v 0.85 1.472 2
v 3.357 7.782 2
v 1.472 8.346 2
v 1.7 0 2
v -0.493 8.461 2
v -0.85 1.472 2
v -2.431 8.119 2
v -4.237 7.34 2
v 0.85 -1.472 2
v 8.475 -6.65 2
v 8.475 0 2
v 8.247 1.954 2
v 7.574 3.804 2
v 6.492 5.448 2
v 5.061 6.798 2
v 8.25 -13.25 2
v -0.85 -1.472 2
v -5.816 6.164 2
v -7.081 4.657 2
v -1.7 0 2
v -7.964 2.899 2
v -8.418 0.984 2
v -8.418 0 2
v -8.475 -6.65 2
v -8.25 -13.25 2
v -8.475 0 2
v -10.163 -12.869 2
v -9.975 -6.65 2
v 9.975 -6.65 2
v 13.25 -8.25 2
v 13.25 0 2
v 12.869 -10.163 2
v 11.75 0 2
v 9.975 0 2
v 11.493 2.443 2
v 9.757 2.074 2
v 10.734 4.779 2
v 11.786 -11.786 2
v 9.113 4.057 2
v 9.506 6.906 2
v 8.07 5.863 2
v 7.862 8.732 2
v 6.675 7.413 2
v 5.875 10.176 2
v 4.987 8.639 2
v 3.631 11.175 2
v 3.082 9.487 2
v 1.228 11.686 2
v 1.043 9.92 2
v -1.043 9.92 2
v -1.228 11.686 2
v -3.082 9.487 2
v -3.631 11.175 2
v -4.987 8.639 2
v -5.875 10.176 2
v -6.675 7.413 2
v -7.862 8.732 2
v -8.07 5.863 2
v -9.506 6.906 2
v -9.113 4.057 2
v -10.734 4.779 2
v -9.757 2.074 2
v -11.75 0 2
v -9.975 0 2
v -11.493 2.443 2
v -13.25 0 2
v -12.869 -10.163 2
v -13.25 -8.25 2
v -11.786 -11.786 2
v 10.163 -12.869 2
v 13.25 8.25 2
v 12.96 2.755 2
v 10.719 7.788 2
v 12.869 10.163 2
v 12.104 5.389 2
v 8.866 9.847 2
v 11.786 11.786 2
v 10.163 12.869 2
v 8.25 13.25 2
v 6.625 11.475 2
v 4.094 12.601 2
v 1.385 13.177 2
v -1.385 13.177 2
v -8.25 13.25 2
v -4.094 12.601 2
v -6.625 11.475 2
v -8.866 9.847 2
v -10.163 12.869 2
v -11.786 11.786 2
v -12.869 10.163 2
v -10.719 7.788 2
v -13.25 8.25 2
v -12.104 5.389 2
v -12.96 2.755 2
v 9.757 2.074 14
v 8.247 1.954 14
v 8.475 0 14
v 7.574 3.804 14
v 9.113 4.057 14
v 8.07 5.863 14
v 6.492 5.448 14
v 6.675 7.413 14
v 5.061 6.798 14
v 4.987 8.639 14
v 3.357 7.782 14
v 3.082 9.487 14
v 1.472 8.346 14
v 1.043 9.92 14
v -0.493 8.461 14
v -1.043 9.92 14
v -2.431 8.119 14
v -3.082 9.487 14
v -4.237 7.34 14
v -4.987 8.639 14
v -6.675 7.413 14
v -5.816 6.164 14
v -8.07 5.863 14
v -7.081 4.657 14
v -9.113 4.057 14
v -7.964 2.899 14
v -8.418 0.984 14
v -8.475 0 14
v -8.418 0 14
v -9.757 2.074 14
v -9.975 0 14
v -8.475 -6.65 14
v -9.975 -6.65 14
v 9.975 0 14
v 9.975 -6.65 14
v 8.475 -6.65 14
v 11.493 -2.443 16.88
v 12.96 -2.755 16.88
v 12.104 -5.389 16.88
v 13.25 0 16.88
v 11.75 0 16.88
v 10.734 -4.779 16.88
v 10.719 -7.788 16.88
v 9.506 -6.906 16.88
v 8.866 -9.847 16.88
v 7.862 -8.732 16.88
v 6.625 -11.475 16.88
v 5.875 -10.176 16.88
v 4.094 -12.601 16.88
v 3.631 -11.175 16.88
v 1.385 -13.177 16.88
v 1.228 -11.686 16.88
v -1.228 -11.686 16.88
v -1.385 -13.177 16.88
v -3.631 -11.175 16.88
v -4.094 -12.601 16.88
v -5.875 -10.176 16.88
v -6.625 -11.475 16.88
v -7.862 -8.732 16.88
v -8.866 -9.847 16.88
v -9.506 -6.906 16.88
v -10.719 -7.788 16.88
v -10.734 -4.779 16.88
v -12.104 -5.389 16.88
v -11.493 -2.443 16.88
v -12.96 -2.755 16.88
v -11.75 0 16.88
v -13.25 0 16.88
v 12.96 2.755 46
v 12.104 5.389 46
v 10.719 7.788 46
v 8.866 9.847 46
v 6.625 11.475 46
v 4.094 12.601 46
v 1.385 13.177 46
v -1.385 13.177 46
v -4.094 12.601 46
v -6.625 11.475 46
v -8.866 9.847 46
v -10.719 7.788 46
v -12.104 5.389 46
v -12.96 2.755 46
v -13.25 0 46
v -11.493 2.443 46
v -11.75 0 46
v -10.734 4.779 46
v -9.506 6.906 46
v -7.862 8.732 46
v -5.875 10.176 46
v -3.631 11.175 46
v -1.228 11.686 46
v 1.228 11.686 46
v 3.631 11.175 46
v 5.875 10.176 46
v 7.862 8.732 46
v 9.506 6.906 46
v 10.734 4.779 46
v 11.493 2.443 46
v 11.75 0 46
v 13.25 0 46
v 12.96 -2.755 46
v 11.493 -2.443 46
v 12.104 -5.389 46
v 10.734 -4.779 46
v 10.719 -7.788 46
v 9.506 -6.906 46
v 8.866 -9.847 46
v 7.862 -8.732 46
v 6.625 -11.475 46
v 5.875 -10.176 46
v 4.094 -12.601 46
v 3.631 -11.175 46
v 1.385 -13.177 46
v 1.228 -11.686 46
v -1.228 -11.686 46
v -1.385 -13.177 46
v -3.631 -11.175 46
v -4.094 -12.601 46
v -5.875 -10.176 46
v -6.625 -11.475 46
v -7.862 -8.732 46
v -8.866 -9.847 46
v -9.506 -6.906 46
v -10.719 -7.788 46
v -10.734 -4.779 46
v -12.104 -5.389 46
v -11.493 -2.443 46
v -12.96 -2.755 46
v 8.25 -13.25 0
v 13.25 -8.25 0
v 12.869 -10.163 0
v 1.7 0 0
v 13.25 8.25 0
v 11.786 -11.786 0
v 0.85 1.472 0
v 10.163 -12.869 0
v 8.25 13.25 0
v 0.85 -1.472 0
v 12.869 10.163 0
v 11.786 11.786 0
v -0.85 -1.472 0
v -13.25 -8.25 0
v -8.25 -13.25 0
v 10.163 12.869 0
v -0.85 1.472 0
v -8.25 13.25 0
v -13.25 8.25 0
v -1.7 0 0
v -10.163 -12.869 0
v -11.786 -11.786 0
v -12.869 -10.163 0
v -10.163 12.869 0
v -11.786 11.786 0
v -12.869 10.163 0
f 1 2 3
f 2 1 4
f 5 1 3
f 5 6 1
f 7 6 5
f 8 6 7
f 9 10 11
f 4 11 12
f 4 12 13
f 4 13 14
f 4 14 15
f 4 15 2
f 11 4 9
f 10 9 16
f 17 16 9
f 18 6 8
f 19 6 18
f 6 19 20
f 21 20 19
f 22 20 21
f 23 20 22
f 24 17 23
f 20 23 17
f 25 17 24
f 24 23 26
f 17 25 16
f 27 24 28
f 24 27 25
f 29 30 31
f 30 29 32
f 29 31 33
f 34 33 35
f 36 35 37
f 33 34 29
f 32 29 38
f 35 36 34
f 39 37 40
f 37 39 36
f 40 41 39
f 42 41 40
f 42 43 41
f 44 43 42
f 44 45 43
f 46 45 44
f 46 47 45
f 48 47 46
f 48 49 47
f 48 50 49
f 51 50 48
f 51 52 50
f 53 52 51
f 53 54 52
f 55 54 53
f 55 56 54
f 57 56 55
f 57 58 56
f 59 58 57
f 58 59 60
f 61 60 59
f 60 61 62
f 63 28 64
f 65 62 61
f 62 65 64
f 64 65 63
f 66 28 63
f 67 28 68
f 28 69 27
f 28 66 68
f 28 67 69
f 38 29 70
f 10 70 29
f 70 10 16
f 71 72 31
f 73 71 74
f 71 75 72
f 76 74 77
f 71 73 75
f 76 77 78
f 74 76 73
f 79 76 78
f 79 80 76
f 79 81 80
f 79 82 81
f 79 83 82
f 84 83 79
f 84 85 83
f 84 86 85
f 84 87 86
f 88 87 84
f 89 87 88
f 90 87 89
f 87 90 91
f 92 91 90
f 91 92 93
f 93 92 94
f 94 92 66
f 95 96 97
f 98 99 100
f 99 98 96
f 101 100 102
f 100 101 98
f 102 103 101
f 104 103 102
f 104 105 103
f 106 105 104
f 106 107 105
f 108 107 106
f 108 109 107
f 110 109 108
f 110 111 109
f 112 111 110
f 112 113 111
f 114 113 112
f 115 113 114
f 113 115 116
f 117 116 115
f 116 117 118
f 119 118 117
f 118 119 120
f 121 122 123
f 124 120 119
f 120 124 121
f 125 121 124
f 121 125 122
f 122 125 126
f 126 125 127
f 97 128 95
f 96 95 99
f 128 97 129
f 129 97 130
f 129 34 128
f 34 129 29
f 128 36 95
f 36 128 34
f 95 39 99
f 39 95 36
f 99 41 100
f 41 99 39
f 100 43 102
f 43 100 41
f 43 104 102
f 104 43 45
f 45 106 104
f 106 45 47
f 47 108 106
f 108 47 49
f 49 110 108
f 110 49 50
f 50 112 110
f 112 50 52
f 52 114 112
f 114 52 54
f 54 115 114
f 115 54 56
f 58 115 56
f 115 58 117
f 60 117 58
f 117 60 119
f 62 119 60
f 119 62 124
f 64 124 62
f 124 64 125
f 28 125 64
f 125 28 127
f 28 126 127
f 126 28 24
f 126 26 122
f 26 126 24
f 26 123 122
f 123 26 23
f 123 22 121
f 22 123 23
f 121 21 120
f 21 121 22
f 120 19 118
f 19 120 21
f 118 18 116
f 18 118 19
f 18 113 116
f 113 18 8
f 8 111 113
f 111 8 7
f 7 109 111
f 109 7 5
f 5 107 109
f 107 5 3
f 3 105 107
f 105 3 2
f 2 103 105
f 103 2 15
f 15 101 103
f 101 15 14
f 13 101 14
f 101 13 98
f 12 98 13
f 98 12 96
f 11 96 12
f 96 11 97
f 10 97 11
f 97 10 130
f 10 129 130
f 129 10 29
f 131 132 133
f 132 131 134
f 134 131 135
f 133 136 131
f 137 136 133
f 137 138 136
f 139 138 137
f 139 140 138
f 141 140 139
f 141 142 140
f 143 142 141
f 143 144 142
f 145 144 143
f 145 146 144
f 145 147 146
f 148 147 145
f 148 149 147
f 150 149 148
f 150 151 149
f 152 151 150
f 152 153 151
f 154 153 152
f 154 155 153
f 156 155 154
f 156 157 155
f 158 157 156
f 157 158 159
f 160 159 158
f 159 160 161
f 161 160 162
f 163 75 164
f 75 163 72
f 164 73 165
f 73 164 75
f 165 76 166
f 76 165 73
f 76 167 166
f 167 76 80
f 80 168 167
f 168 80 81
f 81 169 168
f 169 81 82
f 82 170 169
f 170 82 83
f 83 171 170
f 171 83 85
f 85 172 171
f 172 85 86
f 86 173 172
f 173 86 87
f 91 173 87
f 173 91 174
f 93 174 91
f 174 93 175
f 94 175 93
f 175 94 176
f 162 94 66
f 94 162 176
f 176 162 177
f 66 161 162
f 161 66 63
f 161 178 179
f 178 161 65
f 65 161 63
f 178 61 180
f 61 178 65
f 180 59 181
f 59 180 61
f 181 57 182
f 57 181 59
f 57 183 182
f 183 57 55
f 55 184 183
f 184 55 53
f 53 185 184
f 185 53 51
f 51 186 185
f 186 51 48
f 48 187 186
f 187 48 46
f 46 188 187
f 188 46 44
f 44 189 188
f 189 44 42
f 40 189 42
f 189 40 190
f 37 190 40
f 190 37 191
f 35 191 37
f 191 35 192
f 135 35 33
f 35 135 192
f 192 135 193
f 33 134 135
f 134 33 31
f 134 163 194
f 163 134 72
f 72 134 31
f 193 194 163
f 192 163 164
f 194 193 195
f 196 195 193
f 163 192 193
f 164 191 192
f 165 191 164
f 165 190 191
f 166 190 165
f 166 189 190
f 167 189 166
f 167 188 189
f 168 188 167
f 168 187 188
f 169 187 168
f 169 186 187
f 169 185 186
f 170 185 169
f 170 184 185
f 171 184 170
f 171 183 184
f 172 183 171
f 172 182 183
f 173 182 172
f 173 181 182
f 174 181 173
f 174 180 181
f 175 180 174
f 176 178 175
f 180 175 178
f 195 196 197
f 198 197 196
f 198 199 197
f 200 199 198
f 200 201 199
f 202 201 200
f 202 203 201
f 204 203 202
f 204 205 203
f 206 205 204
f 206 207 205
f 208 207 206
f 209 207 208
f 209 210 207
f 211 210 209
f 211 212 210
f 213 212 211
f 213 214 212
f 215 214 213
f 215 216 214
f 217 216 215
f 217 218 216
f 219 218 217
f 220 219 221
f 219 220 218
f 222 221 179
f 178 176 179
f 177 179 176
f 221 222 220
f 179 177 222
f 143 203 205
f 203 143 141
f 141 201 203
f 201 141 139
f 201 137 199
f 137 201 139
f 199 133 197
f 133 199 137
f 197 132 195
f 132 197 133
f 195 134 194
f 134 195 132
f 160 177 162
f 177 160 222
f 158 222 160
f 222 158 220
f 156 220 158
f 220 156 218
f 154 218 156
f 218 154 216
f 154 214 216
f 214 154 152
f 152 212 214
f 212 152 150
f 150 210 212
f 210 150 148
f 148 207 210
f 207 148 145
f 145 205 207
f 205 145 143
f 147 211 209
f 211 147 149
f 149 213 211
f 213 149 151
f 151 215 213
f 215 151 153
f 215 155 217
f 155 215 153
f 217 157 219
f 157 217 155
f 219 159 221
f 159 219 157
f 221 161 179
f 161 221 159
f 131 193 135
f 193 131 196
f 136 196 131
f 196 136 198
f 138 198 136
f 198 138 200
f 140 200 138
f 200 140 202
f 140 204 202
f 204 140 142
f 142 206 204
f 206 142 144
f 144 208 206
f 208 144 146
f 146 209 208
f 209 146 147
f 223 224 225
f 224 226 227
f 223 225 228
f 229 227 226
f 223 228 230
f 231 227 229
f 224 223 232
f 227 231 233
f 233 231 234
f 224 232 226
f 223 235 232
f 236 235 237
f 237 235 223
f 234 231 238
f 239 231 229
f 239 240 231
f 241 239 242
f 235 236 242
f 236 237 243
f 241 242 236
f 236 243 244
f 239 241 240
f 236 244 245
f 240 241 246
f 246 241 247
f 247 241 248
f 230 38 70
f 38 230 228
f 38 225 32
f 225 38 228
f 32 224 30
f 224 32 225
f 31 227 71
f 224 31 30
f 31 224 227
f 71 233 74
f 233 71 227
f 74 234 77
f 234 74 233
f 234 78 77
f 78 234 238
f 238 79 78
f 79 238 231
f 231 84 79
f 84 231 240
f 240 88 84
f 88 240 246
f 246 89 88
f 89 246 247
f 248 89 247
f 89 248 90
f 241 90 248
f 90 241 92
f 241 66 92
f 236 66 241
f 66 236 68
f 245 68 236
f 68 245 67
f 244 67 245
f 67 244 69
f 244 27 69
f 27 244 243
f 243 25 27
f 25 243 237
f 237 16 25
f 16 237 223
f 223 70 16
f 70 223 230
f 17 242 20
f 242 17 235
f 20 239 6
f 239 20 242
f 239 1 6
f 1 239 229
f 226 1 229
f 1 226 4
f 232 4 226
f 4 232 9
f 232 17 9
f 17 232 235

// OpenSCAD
//Configuration:
//Coin diameter (mm)
coinSz = 21.0;
//Coin thickness (mm)
coinTh = 1.6;
//Maximum coins
coins = 20;
//Gap for finger size
finger = 12;
//Mounting hole diameter (mm)
holeSz = 3.4;

//Other configurations:
//reduction for the coin not to fall by itself
iFactor = 0.95;
//Walls thickness
wallTh = 3; //[2:5]

ioRing = coinSz * iFactor;
iiRing = ioRing - wallTh;
height = coins * coinTh + finger;

//---------------------------------------------
//geometrias
//tools
module chaflan(size, tr = [0, 0], rt = 0){
    translate([tr[0], tr[1]])
        rotate(rt - 180)
            difference(){
                square(size);
                translate([size, size])
                    circle(r=size);
            }
}
//---------------------------------------------
//simples
module rSquare(sz, chSz){
    difference(){
        square(sz, true);
        chaflan(chSz, [szB/2, szB/2], 0);
        chaflan(chSz, [-szB/2, szB/2], 90);
        chaflan(chSz, [-szB/2, -szB/2], 180);
        chaflan(chSz, [szB/2, -szB/2], 270);
    }
}

module slice(d, cutAng){
    R = d * sqrt(2)/2;
    intersection(){
        circle(d=d);
        polygon([
            [0, 0],
            [R, 0],
            [R * cos(cutAng * (1/8)), R * sin(cutAng * (1/8))],
            [R * cos(cutAng * (2/8)), R * sin(cutAng * (2/8))],
            [R * cos(cutAng * (3/8)), R * sin(cutAng * (3/8))],
            [R * cos(cutAng * (4/8)), R * sin(cutAng * (4/8))],
            [R * cos(cutAng * (5/8)), R * sin(cutAng * (5/8))],
            [R * cos(cutAng * (6/8)), R * sin(cutAng * (6/8))],
            [R * cos(cutAng * (7/8)), R * sin(cutAng * (7/8))],
            [R * cos(cutAng), R * sin(cutAng)],
        ]);
    }
}

module ring(outer, inner){
    difference(){
        circle(d=outer);
        circle(d=inner);
    }
}

module sliceRing(outer, inner, ang) {
    intersection(){
        ring(outer, inner);
        slice(outer, ang);
    }
}

module uRing (o, i, l) {
    sliceRing(o, i, 180);
    translate([0,-l/2])
        difference() {
            square([o, l], true);
            square([i, l], true);
        }
}

//---------------------------------------------
//base
thSz = 4; //thingy Size
thOff = 2; //thingy offset

module cBase(ht, szB, szCh, holeSz){
    linear_extrude(ht){
        difference(){
            rSquare(szB, szCh);
            //montaje
            circle(d=holeSz);
        }
    }
}
//---------------------------------------------
//main
//datos anillo exterior
oiRing = coinSz + 2.5; //alejado 3 capas
ooRing = oiRing + wallTh;

szB = ooRing;
baseH = 2;
szCh = 5;
color("blue")
cBase(baseH, szB, szCh, holeSz);

gap = coinTh * 1.8;
translate([0, 0, baseH]){
    union(){
        //interior
        color("cyan")
        linear_extrude(finger){
            uRing(ioRing, iiRing, ioRing/3);
        }
        //exterior con hueco para moneda
        linear_extrude(finger + gap){
            sliceRing(ooRing, oiRing, 180);
        }
        //resto del exterior
        translate([0, 0, finger + gap])
        linear_extrude(height - finger - gap){
            ring(ooRing, oiRing);
        }
    }
}
